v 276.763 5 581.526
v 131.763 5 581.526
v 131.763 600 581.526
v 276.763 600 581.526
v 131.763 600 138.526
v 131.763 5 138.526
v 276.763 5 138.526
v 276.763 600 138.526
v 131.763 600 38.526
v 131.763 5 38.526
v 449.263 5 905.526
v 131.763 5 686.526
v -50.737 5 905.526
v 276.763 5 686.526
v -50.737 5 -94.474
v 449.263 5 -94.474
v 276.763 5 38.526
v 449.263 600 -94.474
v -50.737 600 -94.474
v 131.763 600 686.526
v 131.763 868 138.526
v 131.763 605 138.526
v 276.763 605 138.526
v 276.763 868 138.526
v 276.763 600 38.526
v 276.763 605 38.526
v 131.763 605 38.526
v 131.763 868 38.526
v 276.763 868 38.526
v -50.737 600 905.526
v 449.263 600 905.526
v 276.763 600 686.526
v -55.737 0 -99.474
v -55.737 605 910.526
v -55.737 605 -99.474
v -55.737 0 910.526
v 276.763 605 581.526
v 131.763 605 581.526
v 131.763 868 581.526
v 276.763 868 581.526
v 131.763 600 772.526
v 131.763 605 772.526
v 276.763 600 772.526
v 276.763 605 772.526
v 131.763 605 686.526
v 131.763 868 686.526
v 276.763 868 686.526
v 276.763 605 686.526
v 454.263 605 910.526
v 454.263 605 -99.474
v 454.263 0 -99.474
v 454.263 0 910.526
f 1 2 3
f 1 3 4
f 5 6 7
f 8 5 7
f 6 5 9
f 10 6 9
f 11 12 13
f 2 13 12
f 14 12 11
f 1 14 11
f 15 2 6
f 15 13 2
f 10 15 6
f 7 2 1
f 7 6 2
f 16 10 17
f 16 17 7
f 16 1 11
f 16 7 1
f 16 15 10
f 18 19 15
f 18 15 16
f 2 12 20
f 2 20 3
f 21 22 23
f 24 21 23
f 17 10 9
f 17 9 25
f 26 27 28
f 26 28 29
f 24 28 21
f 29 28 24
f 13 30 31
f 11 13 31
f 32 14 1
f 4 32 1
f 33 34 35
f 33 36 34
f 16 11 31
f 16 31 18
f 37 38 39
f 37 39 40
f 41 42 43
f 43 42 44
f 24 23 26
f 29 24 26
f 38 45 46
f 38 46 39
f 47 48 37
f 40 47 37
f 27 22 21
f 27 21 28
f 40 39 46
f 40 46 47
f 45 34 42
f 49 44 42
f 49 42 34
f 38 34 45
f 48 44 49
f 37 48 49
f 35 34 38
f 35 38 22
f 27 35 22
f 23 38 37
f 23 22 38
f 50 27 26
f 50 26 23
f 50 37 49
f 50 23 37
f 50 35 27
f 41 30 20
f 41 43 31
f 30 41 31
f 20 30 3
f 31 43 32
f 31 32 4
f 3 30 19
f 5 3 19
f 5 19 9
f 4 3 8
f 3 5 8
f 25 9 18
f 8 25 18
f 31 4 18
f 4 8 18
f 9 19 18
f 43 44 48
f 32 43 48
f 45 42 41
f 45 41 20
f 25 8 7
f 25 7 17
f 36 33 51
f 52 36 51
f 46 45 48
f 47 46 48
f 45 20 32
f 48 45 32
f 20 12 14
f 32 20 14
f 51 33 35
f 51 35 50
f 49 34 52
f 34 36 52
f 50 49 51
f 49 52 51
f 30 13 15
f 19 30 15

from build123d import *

# Parameters (mm, degrees)
ESQUISSE2_W             = 510
ESQUISSE2_H             = 1010
BOSS_EXTRU_1_DEPTH      = 5
ESQUISSE4_W             = 510
ESQUISSE4_H             = 1010
ESQUISSE4_W_2           = 500
ESQUISSE4_H_2           = 1000
BOSS_EXTRU_2_DEPTH      = 595
ESQUISSE5_W             = 510
ESQUISSE5_H             = 1010
BOSS_EXTRU_3_DEPTH      = 5
ESQUISSE6_W             = 145
ESQUISSE6_H             = 191
ESQUISSE6_H_2           = 100
ENL_V_MAT_EXTRU_1_DEPTH = 10
ESQUISSE8_W             = 145
ESQUISSE8_H             = 100
ESQUISSE8_H_2           = 105
BOSS_EXTRU_5_DEPTH      = 863


with BuildPart() as part:
    # Esquisse2 → Boss.-Extru.1 (new body)
    with BuildSketch(Plane(origin=(0, 0, 0), x_dir=(1, 0, 0), z_dir=(0, 1, 0))):
        with Locations((199.263257584, -405.525758022)):
            Rectangle(ESQUISSE2_W, ESQUISSE2_H)
    extrude(amount=BOSS_EXTRU_1_DEPTH)

    # Esquisse4 → Boss.-Extru.2 (add)
    with BuildSketch(Plane(origin=(0, 5, 0), x_dir=(1, 0, 0), z_dir=(0, 1, 0))):
        with Locations((199.263257584, -405.525758022)):
            Rectangle(ESQUISSE4_W, ESQUISSE4_H)
        with Locations((199.263257584, -405.525758022)):
            Rectangle(ESQUISSE4_W_2, ESQUISSE4_H_2, mode=Mode.SUBTRACT)
    extrude(amount=BOSS_EXTRU_2_DEPTH)

    # Esquisse5 → Boss.-Extru.3 (add)
    with BuildSketch(Plane(origin=(0, 600, 0), x_dir=(1, 0, 0), z_dir=(0, 1, 0))):
        with Locations((199.263257584, -405.525758022)):
            Rectangle(ESQUISSE5_W, ESQUISSE5_H)
    extrude(amount=BOSS_EXTRU_3_DEPTH)

    # Esquisse6 → Enlèv. mat.-Extru.1 (cut)
    with BuildSketch(Plane(origin=(0, 605, 0), x_dir=(1, 0, 0), z_dir=(0, 1, 0))):
        with Locations((204.263257584, -677.025758022)):
            Rectangle(ESQUISSE6_W, ESQUISSE6_H)
        with Locations((204.263257584, -88.525758022)):
            Rectangle(ESQUISSE6_W, ESQUISSE6_H_2)
    extrude(amount=-ENL_V_MAT_EXTRU_1_DEPTH, mode=Mode.SUBTRACT)

    # Esquisse8 → Boss.-Extru.5 (add)
    with BuildSketch(Plane(origin=(0, 5, 0), x_dir=(1, 0, 0), z_dir=(0, 1, 0))):
        with Locations((204.263257584, -88.525758022)):
            Rectangle(ESQUISSE8_W, ESQUISSE8_H)
        with Locations((204.263257584, -634.025758022)):
            Rectangle(ESQUISSE8_W, ESQUISSE8_H_2)
    extrude(amount=BOSS_EXTRU_5_DEPTH)


solid = part.part
